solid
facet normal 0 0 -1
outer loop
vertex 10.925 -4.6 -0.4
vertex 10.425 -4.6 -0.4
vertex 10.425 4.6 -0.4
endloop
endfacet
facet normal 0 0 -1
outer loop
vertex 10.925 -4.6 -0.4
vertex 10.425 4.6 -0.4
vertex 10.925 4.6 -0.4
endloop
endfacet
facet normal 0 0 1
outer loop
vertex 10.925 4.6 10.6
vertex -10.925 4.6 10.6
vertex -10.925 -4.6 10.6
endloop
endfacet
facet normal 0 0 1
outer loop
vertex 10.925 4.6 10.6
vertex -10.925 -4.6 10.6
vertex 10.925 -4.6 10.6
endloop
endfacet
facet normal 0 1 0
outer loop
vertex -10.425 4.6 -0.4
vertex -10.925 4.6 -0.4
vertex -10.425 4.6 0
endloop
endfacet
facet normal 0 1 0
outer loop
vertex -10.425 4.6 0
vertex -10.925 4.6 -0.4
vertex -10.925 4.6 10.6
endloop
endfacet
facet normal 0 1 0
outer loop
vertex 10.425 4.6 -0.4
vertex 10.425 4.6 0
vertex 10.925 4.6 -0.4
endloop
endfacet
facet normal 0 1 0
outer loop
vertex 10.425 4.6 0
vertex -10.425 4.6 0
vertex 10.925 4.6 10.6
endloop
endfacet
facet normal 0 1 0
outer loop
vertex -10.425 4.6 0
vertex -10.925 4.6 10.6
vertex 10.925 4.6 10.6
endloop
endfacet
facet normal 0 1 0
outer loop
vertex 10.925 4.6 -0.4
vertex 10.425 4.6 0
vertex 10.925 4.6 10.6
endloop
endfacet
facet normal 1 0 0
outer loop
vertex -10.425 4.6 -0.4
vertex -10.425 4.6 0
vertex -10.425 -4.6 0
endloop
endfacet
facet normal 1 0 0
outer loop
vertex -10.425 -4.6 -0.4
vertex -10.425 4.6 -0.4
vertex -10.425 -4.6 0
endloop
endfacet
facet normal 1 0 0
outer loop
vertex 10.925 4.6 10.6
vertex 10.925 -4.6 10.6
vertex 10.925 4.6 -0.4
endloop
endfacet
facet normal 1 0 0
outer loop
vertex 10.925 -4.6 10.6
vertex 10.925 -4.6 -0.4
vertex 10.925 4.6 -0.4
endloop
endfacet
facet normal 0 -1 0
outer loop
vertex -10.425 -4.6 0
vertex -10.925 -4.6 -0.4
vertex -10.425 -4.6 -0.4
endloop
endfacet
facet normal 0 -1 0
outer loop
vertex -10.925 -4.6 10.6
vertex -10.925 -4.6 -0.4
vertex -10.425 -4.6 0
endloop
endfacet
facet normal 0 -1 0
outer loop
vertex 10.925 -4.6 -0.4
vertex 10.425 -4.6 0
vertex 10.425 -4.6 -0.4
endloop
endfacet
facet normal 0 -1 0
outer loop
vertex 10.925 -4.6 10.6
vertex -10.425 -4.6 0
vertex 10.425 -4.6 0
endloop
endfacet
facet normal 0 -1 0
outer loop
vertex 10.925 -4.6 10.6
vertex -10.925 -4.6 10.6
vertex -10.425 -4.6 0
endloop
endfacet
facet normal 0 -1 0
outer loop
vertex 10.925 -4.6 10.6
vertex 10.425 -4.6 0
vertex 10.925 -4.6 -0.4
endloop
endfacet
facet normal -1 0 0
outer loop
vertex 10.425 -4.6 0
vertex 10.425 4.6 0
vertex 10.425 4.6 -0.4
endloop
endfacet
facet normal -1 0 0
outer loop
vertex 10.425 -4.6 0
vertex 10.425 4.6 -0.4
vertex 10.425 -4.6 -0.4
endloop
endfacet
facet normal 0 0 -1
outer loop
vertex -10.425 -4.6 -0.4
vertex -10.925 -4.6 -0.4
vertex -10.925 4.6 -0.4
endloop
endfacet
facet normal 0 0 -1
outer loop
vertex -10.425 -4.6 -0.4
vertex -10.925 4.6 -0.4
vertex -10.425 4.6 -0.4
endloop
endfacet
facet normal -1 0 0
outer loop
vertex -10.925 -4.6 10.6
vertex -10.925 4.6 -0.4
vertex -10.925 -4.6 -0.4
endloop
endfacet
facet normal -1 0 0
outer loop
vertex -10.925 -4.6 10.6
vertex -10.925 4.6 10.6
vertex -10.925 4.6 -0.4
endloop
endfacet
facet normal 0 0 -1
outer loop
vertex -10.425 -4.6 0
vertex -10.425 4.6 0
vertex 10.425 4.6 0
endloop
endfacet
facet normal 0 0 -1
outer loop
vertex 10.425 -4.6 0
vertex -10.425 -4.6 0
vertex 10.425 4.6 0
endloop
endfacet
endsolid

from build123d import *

# Parameters (mm, degrees)
F0_W     = 21.85
F0_H     = 9.2
F1_DEPTH = 10.6
F2_W     = 0.5
F2_H     = 9.2
F3_DEPTH = 0.4


with BuildPart() as f1:
    # F0 (on Top) → F1 (new body)
    with BuildSketch(Plane.XY):
        Rectangle(F0_W, F0_H)
    extrude(amount=F1_DEPTH)

    # F2 (on face) → F3 (join)
    with BuildSketch(Plane(origin=(0, 0, 0), x_dir=(1, 0, 0), z_dir=(0, 0, -1))):
        with Locations((-10.675, 0)):
            Rectangle(F2_W, F2_H)
        with Locations((10.675, 0)):
            Rectangle(F2_W, F2_H)
    extrude(amount=F3_DEPTH)


solid = f1.part
